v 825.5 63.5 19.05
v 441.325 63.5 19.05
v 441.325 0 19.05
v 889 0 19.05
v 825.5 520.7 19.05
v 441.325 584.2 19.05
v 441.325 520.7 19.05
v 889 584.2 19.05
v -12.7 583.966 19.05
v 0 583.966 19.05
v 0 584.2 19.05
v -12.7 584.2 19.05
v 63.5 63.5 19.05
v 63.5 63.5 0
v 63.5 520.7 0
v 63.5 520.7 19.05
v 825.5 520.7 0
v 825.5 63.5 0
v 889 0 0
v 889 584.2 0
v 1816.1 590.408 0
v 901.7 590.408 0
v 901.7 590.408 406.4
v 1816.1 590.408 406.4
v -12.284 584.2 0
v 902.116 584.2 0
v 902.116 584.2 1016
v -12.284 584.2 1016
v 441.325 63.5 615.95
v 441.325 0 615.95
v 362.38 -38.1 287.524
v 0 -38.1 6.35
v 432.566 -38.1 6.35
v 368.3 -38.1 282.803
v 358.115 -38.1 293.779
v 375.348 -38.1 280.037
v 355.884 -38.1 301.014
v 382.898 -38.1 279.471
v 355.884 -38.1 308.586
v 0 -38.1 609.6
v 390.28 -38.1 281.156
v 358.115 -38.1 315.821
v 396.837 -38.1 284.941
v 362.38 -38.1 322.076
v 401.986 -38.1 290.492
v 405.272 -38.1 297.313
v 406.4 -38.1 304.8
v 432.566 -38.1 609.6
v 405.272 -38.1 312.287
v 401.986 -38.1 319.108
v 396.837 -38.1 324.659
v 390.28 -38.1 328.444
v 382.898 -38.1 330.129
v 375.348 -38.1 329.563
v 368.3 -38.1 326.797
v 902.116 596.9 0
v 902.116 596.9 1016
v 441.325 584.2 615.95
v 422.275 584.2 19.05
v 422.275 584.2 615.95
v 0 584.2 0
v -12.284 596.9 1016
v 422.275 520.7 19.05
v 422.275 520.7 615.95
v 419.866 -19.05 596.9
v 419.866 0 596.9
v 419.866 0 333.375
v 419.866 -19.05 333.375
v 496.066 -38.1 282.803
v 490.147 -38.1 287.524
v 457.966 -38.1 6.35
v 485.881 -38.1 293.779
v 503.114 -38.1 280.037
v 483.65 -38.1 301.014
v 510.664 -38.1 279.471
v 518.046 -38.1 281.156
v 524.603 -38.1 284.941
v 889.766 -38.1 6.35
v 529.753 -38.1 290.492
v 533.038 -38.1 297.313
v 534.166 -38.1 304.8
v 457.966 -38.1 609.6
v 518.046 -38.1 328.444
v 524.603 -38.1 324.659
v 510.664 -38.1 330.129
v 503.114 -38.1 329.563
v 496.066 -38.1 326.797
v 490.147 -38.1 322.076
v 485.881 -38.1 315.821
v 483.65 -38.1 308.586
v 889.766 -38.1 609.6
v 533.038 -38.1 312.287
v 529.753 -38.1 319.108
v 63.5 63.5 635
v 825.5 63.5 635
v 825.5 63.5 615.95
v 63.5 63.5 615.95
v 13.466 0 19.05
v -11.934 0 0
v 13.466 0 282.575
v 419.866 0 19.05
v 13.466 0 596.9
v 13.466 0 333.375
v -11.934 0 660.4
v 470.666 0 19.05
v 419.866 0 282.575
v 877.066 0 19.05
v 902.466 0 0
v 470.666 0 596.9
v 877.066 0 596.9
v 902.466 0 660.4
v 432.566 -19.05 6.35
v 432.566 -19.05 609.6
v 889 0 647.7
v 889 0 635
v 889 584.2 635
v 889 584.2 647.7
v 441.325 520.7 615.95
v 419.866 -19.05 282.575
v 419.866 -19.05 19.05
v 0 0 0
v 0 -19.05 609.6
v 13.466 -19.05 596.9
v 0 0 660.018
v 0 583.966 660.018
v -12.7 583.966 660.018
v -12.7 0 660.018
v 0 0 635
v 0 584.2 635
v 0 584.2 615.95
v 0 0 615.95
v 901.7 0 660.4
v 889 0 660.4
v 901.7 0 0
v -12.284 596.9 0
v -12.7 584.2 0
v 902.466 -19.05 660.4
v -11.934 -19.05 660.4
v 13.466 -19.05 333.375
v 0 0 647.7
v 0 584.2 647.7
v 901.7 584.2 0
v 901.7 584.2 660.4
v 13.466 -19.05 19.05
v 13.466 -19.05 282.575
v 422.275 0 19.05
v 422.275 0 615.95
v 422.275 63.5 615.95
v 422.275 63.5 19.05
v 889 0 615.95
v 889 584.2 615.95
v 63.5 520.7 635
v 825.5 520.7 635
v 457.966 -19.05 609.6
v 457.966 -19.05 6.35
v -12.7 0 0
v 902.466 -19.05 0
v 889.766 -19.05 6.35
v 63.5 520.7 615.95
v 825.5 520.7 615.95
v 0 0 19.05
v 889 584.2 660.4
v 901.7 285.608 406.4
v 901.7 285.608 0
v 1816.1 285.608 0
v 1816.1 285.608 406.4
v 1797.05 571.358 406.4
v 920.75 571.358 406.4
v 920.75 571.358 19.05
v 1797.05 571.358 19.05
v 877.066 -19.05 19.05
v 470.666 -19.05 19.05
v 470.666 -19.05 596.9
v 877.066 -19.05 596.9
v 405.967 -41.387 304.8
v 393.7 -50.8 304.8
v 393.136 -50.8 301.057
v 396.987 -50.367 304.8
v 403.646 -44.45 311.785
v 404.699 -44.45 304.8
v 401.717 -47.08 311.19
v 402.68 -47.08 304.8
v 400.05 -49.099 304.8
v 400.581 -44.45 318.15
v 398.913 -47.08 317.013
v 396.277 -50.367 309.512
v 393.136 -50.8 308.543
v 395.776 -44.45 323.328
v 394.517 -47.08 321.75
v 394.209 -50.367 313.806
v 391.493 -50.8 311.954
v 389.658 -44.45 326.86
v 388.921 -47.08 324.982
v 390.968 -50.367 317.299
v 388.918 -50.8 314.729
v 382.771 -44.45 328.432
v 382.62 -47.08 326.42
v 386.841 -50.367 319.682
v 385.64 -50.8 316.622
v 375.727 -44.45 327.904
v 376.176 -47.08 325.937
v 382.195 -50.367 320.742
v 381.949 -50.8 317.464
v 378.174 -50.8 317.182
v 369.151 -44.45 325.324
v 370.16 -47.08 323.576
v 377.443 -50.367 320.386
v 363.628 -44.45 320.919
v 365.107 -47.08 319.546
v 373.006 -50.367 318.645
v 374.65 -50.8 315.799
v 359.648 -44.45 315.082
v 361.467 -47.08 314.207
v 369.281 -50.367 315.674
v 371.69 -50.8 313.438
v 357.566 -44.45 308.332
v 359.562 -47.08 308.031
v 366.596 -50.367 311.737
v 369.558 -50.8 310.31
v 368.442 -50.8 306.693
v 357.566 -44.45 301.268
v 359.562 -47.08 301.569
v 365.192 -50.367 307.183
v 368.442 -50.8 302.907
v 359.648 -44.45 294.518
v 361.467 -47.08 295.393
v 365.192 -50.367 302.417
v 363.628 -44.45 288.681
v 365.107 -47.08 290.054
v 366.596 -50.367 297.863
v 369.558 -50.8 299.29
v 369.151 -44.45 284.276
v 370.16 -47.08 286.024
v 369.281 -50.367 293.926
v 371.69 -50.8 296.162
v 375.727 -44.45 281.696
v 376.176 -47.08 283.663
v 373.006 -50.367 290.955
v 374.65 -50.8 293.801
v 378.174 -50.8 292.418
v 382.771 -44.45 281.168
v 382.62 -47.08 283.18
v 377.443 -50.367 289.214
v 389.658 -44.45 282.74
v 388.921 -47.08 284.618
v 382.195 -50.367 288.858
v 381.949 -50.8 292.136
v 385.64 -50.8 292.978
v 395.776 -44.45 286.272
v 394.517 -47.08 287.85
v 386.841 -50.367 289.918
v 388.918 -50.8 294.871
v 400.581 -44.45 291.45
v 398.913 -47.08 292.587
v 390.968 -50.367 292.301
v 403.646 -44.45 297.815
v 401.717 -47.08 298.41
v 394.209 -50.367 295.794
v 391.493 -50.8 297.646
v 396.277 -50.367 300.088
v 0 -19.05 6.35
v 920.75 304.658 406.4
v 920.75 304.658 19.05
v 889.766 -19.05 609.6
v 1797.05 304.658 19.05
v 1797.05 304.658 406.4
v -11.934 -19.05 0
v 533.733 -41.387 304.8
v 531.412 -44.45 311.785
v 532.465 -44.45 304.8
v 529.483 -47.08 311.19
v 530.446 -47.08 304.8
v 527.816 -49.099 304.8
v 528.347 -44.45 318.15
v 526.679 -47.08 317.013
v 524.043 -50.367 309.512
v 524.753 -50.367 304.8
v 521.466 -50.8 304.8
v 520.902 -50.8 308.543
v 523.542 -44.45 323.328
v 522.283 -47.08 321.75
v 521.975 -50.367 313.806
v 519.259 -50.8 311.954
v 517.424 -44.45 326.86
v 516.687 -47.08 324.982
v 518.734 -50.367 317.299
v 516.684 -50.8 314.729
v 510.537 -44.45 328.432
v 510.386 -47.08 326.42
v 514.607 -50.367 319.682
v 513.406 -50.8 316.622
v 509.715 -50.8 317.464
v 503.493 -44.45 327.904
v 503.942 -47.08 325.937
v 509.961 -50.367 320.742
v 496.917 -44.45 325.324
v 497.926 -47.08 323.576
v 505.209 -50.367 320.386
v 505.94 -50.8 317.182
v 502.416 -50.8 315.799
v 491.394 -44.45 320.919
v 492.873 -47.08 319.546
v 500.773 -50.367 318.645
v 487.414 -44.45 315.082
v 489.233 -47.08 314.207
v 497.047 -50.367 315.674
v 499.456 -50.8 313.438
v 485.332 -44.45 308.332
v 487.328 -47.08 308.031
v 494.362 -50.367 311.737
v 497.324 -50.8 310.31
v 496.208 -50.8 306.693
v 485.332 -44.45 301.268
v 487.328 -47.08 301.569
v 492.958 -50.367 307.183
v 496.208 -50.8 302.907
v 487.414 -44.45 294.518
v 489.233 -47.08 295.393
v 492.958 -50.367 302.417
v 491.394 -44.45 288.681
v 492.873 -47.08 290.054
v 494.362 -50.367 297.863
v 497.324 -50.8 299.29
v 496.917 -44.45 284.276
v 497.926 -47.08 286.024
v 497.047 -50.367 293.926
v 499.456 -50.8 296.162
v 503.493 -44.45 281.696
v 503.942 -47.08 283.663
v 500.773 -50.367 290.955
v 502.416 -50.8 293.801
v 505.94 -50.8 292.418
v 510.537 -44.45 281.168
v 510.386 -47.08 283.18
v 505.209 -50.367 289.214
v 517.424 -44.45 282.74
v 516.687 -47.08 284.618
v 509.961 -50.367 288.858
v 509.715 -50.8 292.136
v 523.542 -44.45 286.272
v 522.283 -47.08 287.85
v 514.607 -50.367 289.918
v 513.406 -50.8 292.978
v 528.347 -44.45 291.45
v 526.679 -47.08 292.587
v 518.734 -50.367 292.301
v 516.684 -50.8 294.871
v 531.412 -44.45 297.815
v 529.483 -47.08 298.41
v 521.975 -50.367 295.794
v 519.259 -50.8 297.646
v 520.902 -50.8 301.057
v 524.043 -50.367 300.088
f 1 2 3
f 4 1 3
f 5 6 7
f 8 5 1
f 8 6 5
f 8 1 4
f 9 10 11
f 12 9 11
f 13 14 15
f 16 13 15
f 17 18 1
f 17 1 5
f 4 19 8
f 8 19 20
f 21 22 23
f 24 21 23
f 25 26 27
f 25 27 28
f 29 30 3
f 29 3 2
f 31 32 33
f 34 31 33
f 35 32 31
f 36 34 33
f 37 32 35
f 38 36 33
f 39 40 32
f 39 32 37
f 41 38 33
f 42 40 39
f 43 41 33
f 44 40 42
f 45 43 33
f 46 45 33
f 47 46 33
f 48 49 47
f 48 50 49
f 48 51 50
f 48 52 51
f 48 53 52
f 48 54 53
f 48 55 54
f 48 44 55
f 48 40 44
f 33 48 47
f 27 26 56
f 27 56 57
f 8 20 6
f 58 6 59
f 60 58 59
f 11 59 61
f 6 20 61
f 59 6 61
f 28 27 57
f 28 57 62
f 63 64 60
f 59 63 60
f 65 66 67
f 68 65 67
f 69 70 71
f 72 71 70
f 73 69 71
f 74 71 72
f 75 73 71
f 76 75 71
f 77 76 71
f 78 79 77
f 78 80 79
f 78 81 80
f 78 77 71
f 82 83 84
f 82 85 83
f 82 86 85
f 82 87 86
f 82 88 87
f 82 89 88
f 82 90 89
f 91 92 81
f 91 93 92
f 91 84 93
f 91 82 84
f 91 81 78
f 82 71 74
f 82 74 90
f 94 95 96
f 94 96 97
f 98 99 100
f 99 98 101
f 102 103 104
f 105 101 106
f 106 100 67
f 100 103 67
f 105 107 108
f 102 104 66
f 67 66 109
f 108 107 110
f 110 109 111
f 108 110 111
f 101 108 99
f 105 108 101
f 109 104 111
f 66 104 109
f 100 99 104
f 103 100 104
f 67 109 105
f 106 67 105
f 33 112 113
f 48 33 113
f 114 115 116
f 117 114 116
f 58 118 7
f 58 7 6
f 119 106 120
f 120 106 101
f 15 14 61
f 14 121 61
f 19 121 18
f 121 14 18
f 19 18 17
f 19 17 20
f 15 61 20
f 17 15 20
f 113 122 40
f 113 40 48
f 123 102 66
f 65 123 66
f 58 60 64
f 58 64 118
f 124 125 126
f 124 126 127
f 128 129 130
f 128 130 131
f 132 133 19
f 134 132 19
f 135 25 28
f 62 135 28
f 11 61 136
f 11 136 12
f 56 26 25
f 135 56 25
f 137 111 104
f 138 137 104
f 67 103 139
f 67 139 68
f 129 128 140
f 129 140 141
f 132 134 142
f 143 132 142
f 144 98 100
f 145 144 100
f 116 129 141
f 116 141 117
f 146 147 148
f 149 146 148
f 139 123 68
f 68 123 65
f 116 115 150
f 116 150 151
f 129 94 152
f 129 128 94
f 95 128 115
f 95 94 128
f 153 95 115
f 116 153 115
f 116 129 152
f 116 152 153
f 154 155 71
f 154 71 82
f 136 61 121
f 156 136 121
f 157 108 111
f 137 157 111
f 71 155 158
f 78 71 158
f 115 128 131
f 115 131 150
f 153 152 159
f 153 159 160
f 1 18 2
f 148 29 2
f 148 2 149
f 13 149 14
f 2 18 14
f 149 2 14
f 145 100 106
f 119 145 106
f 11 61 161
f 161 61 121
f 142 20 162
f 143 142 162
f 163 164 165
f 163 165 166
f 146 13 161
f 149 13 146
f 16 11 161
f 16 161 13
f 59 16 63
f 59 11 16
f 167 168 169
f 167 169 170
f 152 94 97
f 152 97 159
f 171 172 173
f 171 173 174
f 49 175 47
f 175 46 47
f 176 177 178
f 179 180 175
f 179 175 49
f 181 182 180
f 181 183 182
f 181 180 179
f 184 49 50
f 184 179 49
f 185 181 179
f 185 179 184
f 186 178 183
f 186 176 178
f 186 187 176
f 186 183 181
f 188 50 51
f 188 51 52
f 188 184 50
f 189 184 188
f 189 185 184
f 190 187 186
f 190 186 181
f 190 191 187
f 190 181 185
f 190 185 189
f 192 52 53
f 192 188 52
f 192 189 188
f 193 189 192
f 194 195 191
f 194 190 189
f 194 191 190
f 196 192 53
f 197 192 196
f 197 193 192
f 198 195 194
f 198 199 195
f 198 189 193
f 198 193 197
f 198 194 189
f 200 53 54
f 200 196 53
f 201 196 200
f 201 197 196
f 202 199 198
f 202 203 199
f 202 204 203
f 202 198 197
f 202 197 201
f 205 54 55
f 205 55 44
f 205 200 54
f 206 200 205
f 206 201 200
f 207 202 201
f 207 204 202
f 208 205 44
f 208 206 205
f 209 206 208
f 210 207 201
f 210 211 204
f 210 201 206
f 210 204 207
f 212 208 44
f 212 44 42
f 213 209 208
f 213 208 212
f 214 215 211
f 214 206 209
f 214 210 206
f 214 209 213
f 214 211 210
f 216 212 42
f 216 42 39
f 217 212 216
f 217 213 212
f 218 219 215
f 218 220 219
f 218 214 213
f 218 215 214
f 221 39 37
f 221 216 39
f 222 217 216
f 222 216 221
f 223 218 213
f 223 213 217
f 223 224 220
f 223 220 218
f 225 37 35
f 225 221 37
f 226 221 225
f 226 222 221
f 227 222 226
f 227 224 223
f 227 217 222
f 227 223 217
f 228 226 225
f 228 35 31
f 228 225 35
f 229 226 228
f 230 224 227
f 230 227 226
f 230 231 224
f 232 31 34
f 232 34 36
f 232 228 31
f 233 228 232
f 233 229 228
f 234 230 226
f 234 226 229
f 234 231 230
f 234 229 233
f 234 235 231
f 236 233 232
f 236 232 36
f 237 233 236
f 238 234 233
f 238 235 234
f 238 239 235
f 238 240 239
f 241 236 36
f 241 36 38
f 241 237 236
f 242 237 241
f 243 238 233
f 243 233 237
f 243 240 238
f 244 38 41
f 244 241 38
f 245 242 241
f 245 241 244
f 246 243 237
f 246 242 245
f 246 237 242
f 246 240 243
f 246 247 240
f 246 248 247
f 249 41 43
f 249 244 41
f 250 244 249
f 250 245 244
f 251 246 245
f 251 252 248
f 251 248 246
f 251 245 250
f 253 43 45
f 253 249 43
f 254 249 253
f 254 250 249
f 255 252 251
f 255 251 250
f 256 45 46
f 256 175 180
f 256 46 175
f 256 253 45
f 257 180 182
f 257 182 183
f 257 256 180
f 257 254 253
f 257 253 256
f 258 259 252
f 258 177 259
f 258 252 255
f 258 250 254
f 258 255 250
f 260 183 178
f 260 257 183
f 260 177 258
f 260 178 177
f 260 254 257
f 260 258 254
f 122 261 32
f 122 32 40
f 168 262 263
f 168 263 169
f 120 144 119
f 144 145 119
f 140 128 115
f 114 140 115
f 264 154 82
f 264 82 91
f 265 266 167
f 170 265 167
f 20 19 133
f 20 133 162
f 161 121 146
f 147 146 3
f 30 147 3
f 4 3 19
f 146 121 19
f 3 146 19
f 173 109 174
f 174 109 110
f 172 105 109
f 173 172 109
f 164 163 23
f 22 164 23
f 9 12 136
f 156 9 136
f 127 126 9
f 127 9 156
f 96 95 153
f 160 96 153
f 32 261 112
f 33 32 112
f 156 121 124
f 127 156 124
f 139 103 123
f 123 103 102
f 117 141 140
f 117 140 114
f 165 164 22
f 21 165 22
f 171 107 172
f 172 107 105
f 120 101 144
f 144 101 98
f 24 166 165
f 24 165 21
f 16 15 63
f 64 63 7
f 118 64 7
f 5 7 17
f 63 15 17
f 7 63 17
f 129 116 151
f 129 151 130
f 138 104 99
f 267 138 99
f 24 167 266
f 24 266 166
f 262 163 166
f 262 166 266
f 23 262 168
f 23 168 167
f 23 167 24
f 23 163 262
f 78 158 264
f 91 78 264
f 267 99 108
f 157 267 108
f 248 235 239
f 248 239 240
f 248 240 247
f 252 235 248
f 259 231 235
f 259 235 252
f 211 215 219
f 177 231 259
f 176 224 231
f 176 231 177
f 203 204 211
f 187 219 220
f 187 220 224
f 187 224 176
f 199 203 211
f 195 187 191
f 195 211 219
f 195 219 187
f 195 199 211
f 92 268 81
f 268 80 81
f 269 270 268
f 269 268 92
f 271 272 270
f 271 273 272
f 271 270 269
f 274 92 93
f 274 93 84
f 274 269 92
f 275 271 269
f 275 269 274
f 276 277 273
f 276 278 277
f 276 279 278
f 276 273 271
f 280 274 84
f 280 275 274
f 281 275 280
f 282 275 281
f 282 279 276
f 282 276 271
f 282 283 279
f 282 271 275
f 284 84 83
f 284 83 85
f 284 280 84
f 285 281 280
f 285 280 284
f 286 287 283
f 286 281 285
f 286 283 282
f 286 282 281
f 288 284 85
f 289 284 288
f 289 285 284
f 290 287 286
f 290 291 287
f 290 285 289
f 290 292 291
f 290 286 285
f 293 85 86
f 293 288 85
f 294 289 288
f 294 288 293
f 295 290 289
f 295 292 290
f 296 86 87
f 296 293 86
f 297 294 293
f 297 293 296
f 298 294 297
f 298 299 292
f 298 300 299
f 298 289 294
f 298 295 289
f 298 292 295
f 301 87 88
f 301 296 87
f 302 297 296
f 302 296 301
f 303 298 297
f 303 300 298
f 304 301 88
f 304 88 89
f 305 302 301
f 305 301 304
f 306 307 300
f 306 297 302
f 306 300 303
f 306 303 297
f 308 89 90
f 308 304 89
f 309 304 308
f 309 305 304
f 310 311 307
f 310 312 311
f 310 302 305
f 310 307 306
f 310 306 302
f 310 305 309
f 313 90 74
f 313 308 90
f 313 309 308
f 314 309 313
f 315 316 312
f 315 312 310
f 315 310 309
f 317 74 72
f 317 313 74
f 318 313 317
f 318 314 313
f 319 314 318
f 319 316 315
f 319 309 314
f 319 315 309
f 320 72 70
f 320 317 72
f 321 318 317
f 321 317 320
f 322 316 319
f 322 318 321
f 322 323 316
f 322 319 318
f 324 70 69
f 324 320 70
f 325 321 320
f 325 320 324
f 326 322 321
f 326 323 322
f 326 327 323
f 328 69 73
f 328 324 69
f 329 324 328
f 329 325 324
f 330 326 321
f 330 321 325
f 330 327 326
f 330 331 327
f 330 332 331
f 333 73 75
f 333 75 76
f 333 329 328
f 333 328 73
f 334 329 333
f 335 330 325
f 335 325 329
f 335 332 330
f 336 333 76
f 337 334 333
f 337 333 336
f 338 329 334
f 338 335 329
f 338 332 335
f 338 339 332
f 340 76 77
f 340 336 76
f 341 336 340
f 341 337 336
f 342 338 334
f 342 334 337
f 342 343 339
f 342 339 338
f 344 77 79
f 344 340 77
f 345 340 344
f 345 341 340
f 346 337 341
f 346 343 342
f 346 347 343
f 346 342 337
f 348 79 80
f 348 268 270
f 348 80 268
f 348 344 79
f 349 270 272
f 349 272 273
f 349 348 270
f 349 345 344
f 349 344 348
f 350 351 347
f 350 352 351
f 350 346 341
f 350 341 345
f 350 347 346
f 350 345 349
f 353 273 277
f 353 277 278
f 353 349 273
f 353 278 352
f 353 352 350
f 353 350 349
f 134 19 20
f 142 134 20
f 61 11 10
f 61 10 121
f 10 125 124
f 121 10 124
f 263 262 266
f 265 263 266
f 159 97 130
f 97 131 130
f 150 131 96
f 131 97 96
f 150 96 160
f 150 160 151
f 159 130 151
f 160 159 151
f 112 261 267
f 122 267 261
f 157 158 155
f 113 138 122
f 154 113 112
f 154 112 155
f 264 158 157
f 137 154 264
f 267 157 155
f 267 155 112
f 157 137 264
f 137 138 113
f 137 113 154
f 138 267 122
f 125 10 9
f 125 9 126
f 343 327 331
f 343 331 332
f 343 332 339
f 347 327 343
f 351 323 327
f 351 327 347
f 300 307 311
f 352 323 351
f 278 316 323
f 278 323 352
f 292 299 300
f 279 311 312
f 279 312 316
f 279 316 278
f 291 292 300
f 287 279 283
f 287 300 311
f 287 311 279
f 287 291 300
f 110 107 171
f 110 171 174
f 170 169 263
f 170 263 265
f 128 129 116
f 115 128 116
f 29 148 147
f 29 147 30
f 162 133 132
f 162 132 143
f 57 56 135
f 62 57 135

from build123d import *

# Parameters (mm, degrees)
F0_W      = 63.5
F0_H      = 457.2
F1_DEPTH  = 19.05
F2_W      = 584.2
F2_H      = 641.35
F2_H_2    = 19.05
F3_DEPTH  = 12.7
F4_W      = 583.9663306236
F4_H      = 19.05
F4_W_2    = 0.2336693764
F4_H_2    = 640.9677320718
F5_DEPTH  = 12.7
F6_W      = 914.4
F6_H      = 1016
F7_DEPTH  = 12.7
F8_W      = 25.4
F8_H      = 577.85
F8_W_2    = 406.4
F8_H_2    = 50.8
F9_DEPTH  = 19.05
F10_W     = 431.8
F10_H     = 603.25
F10_W_2   = 406.4
F10_H_2   = 577.85
F10_W_3   = 432.5660707131
F10_H_3   = 263.525
F11_DEPTH = 19.05
F12_R     = 25.4
F13_DEPTH = 12.7
F14_R     = 12.69999
F15_W     = 304.8
F15_H     = 406.4
F16_DEPTH = 914.4
F17_W     = 876.3
F17_H     = 266.7
F19_DEPTH = 387.35
F20_W     = 63.5
F20_H     = 457.2
F21_DEPTH = 19.05
F22_W     = 19.05
F22_H     = 63.5
F23_DEPTH = 596.9
F24_W     = 889
F24_H     = 584.2
F25_DEPTH = 12.7


# Not quite as in the source:
# - a fillet or chamfer is up to 0.001 mm smaller than in the source, because OpenCascade refuses the exact size
# - a feature names something its author has since deleted; it is built from what else it names


with BuildPart() as f1:
    # F0 (on Top) → F1 (new body)
    with BuildSketch(Plane.XY):
        Polygon((0, 63.5), (0, 0), (889, 0), (889, 63.5), (825.5, 63.5), (63.5, 63.5), align=None)
        with Locations((31.75, 292.1)):
            Rectangle(F0_W, F0_H)
        with Locations((857.25, 292.1)):
            Rectangle(F0_W, F0_H)
        Polygon((0, 584.2), (0, 520.7), (63.5, 520.7), (825.5, 520.7), (889, 520.7), (889, 584.2), align=None)
    extrude(amount=F1_DEPTH)

    # F22 (on face) → F23 (join, through all)
    with BuildSketch(Plane.XY.offset(19.05)):
        with Locations((431.8, 31.75)):
            Rectangle(F22_W, F22_H)
        with Locations((431.8, 552.45)):
            Rectangle(F22_W, F22_H)
    extrude(amount=F23_DEPTH)


with BuildPart() as f3:
    # F2 (on face) → F3 (new body)
    with BuildSketch(Plane.YZ.offset(889)):
        with Locations((292.1, 339.725)):
            Rectangle(F2_W, F2_H)
        with Locations((292.1, 9.525)):
            Rectangle(F2_W, F2_H_2)
    extrude(amount=F3_DEPTH)


with BuildPart() as f5:
    # F4 (on face) → F5 (new body)
    with BuildSketch(Plane(origin=(0, 0, 0), x_dir=(0, -1, 0), z_dir=(-1, 0, 0))):
        with Locations((-291.9831653118, 9.525)):
            Rectangle(F4_W, F4_H)
        with Locations((-584.0831653118, 9.525)):
            Rectangle(F4_W_2, F4_H)
        with Locations((-291.9831653118, 339.5338660359)):
            Rectangle(F4_W, F4_H_2)
    extrude(amount=F5_DEPTH)


with BuildPart() as f7:
    # F6 (on face) → F7 (new body)
    with BuildSketch(Plane(origin=(0, 584.2, 0), x_dir=(-1, 0, 0), z_dir=(0, 1, 0))):
        with Locations((-444.9155238152, 508)):
            Rectangle(F6_W, F6_H)
    extrude(amount=F7_DEPTH)


with BuildPart() as f9:
    # F8 (on face) → F9 (new body)
    with BuildSketch(Plane.XZ):
        Polygon((-11.9339292869, 19.05), (-11.9339292869, 0), (902.4660707131, 0), (902.4660707131, 19.05), (877.0660707131, 19.05), (470.6660707131, 19.05), (419.8660707131, 19.05), (13.4660707131, 19.05), align=None)
        Polygon((-11.9339292869, 596.9), (-11.9339292869, 19.05), (13.4660707131, 19.05), (13.4660707131, 282.575), (13.4660707131, 333.375), (13.4660707131, 596.9), align=None)
        with Locations((889.7660707131, 307.975)):
            Rectangle(F8_W, F8_H)
        Polygon((-11.9339292869, 660.4), (-11.9339292869, 596.9), (13.4660707131, 596.9), (419.8660707131, 596.9), (470.6660707131, 596.9), (877.0660707131, 596.9), (902.4660707131, 596.9), (902.4660707131, 660.4), align=None)
        Polygon((419.8660707131, 282.575), (419.8660707131, 19.05), (470.6660707131, 19.05), (470.6660707131, 596.9), (419.8660707131, 596.9), (419.8660707131, 333.375), align=None)
        with Locations((216.6660707131, 307.975)):
            Rectangle(F8_W_2, F8_H_2)
    extrude(amount=F9_DEPTH)

    # F10 (on face) → F11 (join)
    with BuildSketch(Plane.XZ.offset(19.05)):
        with Locations((673.8660707131, 307.975)):
            Rectangle(F10_W, F10_H)
        with Locations((673.8660707131, 307.975)):
            Rectangle(F10_W_2, F10_H_2, mode=Mode.SUBTRACT)
        with Locations((673.8660707131, 307.975)):
            Rectangle(F10_W_2, F10_H_2)
        with Locations((216.2830353566, 307.975)):
            Rectangle(F10_W_3, F10_H)
        with Locations((216.6660707131, 150.8125)):
            Rectangle(F10_W_2, F10_H_3, mode=Mode.SUBTRACT)
        with Locations((216.6660707131, 465.1375)):
            Rectangle(F10_W_2, F10_H_3, mode=Mode.SUBTRACT)
        with Locations((216.6660707131, 465.1375)):
            Rectangle(F10_W_2, F10_H_3)
        with Locations((216.6660707131, 150.8125)):
            Rectangle(F10_W_2, F10_H_3)
    extrude(amount=F11_DEPTH)

    # F12 (on face) → F13 (join)
    with BuildSketch(Plane.XZ.offset(38.1)):
        with Locations((508.7660707131, 304.8)):
            Circle(F12_R)
        with Locations((381, 304.8)):
            Circle(F12_R)
    extrude(amount=F13_DEPTH)

    # F14 (radius 12.7 in the source; OpenCascade refuses exactly that, so slightly less here)
    f14_edges = [f9.edges().sort_by_distance(p)[0] for p in [
        (483.366071, -50.8, 304.8),
        (355.6, -50.8, 304.8),
    ]]
    fillet(f14_edges, radius=F14_R)


with BuildPart() as f16:
    # F15 (on face) → F16 (new body)
    with BuildSketch(Plane.YZ.offset(901.7)):
        with Locations((438.0083848, 203.2)):
            Rectangle(F15_W, F15_H)
    extrude(amount=F16_DEPTH)

    # F17 (on face) → F19 (cut, through all)
    with BuildSketch(Plane.XY.offset(406.4)):
        with Locations((1358.9, 438.0083848)):
            Rectangle(F17_W, F17_H)
    extrude(amount=-F19_DEPTH, mode=Mode.SUBTRACT)


with BuildPart() as f21:
    # F20 (on offset) → F21 (new body)
    with BuildSketch(Plane.XY.offset(635)):
        Polygon((0, 63.5), (0, 0), (889, 0), (889, 63.5), (825.5, 63.5), (63.5, 63.5), align=None)
        with Locations((31.75, 292.1)):
            Rectangle(F20_W, F20_H)
        with Locations((857.25, 292.1)):
            Rectangle(F20_W, F20_H)
        Polygon((0, 584.2), (0, 520.7), (63.5, 520.7), (825.5, 520.7), (889, 520.7), (889, 584.2), align=None)
    extrude(amount=-F21_DEPTH)


with BuildPart() as f25:
    # F24 (on face) → F25 (new body)
    with BuildSketch(Plane.XY.offset(635)):
        with Locations((444.5, 292.1)):
            Rectangle(F24_W, F24_H)
    extrude(amount=F25_DEPTH)


solid = Compound([f1.part, f3.part, f5.part, f7.part, f9.part, f16.part, f21.part, f25.part])
